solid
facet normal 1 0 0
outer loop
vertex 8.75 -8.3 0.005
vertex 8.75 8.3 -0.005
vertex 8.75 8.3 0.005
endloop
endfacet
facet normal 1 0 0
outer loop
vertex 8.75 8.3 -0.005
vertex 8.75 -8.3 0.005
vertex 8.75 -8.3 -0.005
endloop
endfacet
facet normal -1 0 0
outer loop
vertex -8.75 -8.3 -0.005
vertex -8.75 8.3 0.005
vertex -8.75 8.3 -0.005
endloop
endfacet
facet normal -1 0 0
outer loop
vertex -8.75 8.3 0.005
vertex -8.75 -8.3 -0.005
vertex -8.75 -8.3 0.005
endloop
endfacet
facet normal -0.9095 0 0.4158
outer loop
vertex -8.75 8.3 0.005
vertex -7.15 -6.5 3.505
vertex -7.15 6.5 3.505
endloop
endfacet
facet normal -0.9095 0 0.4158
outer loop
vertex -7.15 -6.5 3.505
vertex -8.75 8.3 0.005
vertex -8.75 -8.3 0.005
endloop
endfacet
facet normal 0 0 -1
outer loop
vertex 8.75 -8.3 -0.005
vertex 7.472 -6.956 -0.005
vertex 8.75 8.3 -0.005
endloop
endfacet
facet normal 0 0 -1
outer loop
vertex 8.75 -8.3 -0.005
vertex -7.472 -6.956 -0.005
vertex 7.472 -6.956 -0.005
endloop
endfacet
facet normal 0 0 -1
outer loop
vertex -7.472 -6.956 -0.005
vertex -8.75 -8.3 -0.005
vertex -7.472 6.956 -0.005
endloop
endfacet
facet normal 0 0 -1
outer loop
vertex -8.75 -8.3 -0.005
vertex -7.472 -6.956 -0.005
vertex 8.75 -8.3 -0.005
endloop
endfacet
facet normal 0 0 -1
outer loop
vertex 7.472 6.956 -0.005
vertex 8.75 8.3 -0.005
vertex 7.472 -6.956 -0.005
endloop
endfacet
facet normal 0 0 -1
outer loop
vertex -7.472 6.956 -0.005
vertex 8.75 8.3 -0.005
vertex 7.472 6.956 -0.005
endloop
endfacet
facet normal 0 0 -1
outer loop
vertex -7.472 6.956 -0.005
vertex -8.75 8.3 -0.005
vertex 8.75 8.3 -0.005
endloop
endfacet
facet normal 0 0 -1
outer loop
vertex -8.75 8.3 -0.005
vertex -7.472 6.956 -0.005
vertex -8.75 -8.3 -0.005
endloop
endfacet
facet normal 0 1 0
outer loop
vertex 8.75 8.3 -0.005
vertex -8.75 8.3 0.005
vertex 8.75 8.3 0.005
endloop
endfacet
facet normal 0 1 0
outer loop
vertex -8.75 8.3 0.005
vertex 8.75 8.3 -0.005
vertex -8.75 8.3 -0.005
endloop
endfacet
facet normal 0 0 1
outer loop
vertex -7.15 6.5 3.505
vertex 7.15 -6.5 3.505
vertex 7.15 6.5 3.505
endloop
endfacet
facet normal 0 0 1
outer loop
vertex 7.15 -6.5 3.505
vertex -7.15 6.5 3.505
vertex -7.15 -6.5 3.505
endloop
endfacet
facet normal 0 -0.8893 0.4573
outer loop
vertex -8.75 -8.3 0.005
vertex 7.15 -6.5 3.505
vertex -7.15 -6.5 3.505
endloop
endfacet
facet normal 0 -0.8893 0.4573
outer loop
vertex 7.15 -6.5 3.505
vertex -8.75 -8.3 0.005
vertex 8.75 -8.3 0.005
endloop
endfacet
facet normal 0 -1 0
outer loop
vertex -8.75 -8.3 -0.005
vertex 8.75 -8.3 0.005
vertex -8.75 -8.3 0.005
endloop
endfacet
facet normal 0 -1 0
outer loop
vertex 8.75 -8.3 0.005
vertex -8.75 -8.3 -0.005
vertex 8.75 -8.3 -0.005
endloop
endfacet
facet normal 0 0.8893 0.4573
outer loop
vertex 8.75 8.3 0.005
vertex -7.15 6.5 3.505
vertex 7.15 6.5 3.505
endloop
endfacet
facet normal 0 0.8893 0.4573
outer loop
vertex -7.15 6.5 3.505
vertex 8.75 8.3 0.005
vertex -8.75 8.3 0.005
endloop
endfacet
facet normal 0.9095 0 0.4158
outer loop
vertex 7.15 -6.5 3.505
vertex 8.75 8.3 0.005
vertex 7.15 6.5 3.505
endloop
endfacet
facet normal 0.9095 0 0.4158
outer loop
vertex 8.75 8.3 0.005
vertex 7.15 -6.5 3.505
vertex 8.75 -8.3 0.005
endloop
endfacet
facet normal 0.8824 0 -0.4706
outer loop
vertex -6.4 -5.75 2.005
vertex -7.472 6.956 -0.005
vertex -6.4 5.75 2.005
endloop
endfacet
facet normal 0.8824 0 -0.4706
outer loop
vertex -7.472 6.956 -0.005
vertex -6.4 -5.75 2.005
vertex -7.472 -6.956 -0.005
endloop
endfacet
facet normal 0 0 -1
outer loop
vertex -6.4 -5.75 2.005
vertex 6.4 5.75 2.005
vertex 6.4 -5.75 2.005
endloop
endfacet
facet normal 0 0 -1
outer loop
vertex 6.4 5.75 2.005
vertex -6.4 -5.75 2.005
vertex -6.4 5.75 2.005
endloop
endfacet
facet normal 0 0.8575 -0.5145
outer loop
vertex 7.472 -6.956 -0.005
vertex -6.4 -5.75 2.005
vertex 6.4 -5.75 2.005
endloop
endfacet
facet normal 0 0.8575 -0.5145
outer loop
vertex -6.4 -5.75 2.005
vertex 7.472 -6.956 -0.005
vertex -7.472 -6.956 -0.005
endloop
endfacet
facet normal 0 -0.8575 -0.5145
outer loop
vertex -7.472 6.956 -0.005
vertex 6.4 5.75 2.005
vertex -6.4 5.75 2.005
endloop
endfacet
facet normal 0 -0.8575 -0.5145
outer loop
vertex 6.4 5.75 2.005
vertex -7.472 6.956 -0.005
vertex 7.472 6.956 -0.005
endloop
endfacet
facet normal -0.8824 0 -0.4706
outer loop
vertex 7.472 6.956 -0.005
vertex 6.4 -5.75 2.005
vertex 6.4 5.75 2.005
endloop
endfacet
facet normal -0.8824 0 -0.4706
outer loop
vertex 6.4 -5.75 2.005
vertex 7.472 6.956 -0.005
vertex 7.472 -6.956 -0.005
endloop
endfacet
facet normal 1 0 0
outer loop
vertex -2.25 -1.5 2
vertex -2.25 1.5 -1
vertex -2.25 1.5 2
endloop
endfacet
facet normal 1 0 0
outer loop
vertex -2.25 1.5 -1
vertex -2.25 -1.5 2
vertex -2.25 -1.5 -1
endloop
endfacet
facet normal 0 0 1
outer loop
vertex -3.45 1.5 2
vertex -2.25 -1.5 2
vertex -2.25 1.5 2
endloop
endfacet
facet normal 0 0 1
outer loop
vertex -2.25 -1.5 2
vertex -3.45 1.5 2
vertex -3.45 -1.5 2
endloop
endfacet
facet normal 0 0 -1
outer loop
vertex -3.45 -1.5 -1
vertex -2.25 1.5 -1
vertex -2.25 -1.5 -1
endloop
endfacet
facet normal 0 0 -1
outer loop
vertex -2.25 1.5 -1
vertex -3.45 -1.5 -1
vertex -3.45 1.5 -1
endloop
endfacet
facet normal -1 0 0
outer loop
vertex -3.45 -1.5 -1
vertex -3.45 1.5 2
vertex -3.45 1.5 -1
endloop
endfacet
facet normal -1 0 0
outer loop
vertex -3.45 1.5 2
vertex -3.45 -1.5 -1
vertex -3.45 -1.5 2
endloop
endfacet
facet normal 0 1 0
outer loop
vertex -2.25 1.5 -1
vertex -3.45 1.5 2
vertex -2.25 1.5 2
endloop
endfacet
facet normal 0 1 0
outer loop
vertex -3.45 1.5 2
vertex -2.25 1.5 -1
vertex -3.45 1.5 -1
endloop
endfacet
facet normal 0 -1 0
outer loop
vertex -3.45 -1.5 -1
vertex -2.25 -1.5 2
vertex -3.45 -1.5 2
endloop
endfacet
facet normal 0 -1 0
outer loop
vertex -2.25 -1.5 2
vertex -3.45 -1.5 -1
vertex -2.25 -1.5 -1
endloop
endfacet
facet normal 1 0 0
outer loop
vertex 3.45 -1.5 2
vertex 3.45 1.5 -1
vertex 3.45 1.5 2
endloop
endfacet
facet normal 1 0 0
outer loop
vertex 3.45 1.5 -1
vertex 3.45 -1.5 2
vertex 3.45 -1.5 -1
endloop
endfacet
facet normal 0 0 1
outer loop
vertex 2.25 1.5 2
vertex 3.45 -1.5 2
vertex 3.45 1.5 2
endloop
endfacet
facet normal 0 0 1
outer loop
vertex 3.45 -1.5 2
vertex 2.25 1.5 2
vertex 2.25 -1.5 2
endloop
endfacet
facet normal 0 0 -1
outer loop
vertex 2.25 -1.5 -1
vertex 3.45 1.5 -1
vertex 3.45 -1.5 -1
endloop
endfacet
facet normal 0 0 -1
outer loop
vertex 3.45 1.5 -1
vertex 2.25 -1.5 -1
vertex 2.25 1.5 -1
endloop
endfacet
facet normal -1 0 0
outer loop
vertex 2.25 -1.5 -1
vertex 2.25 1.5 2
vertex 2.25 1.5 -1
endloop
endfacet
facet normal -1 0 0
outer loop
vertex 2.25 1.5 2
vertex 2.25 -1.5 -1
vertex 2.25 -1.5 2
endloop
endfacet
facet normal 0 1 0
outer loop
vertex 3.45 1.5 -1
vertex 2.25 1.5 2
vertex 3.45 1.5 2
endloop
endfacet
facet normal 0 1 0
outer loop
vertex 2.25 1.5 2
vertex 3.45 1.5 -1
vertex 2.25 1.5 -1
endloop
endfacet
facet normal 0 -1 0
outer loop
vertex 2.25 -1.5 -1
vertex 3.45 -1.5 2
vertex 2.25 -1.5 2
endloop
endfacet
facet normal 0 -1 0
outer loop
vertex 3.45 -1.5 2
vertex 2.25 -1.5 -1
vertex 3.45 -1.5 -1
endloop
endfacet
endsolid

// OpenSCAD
union () {
  difference () {
    hull () {
      cube ([17.5, 16.6, 0.01], center=true);
      translate ([0, 0, 3.5]) {
        cube ([14.3, 13, 0.01], center=true);
      }
    }
    hull () {
      translate ([0, 0, -1]) {
        cube ([16.0, 15.100000000000001, 0.01], center=true);
      }
      translate ([0, 0, 2.0]) {
        cube ([12.8, 11.5, 0.01], center=true);
      }
    }
  }
  translate ([-2.85, 0, 0.5]) {
    union () {
      cube ([1.2, 3, 3], center=true);
      translate ([5.7, 0, 0]) {
        cube ([1.2, 3, 3], center=true);
      }
    }
  }
}
